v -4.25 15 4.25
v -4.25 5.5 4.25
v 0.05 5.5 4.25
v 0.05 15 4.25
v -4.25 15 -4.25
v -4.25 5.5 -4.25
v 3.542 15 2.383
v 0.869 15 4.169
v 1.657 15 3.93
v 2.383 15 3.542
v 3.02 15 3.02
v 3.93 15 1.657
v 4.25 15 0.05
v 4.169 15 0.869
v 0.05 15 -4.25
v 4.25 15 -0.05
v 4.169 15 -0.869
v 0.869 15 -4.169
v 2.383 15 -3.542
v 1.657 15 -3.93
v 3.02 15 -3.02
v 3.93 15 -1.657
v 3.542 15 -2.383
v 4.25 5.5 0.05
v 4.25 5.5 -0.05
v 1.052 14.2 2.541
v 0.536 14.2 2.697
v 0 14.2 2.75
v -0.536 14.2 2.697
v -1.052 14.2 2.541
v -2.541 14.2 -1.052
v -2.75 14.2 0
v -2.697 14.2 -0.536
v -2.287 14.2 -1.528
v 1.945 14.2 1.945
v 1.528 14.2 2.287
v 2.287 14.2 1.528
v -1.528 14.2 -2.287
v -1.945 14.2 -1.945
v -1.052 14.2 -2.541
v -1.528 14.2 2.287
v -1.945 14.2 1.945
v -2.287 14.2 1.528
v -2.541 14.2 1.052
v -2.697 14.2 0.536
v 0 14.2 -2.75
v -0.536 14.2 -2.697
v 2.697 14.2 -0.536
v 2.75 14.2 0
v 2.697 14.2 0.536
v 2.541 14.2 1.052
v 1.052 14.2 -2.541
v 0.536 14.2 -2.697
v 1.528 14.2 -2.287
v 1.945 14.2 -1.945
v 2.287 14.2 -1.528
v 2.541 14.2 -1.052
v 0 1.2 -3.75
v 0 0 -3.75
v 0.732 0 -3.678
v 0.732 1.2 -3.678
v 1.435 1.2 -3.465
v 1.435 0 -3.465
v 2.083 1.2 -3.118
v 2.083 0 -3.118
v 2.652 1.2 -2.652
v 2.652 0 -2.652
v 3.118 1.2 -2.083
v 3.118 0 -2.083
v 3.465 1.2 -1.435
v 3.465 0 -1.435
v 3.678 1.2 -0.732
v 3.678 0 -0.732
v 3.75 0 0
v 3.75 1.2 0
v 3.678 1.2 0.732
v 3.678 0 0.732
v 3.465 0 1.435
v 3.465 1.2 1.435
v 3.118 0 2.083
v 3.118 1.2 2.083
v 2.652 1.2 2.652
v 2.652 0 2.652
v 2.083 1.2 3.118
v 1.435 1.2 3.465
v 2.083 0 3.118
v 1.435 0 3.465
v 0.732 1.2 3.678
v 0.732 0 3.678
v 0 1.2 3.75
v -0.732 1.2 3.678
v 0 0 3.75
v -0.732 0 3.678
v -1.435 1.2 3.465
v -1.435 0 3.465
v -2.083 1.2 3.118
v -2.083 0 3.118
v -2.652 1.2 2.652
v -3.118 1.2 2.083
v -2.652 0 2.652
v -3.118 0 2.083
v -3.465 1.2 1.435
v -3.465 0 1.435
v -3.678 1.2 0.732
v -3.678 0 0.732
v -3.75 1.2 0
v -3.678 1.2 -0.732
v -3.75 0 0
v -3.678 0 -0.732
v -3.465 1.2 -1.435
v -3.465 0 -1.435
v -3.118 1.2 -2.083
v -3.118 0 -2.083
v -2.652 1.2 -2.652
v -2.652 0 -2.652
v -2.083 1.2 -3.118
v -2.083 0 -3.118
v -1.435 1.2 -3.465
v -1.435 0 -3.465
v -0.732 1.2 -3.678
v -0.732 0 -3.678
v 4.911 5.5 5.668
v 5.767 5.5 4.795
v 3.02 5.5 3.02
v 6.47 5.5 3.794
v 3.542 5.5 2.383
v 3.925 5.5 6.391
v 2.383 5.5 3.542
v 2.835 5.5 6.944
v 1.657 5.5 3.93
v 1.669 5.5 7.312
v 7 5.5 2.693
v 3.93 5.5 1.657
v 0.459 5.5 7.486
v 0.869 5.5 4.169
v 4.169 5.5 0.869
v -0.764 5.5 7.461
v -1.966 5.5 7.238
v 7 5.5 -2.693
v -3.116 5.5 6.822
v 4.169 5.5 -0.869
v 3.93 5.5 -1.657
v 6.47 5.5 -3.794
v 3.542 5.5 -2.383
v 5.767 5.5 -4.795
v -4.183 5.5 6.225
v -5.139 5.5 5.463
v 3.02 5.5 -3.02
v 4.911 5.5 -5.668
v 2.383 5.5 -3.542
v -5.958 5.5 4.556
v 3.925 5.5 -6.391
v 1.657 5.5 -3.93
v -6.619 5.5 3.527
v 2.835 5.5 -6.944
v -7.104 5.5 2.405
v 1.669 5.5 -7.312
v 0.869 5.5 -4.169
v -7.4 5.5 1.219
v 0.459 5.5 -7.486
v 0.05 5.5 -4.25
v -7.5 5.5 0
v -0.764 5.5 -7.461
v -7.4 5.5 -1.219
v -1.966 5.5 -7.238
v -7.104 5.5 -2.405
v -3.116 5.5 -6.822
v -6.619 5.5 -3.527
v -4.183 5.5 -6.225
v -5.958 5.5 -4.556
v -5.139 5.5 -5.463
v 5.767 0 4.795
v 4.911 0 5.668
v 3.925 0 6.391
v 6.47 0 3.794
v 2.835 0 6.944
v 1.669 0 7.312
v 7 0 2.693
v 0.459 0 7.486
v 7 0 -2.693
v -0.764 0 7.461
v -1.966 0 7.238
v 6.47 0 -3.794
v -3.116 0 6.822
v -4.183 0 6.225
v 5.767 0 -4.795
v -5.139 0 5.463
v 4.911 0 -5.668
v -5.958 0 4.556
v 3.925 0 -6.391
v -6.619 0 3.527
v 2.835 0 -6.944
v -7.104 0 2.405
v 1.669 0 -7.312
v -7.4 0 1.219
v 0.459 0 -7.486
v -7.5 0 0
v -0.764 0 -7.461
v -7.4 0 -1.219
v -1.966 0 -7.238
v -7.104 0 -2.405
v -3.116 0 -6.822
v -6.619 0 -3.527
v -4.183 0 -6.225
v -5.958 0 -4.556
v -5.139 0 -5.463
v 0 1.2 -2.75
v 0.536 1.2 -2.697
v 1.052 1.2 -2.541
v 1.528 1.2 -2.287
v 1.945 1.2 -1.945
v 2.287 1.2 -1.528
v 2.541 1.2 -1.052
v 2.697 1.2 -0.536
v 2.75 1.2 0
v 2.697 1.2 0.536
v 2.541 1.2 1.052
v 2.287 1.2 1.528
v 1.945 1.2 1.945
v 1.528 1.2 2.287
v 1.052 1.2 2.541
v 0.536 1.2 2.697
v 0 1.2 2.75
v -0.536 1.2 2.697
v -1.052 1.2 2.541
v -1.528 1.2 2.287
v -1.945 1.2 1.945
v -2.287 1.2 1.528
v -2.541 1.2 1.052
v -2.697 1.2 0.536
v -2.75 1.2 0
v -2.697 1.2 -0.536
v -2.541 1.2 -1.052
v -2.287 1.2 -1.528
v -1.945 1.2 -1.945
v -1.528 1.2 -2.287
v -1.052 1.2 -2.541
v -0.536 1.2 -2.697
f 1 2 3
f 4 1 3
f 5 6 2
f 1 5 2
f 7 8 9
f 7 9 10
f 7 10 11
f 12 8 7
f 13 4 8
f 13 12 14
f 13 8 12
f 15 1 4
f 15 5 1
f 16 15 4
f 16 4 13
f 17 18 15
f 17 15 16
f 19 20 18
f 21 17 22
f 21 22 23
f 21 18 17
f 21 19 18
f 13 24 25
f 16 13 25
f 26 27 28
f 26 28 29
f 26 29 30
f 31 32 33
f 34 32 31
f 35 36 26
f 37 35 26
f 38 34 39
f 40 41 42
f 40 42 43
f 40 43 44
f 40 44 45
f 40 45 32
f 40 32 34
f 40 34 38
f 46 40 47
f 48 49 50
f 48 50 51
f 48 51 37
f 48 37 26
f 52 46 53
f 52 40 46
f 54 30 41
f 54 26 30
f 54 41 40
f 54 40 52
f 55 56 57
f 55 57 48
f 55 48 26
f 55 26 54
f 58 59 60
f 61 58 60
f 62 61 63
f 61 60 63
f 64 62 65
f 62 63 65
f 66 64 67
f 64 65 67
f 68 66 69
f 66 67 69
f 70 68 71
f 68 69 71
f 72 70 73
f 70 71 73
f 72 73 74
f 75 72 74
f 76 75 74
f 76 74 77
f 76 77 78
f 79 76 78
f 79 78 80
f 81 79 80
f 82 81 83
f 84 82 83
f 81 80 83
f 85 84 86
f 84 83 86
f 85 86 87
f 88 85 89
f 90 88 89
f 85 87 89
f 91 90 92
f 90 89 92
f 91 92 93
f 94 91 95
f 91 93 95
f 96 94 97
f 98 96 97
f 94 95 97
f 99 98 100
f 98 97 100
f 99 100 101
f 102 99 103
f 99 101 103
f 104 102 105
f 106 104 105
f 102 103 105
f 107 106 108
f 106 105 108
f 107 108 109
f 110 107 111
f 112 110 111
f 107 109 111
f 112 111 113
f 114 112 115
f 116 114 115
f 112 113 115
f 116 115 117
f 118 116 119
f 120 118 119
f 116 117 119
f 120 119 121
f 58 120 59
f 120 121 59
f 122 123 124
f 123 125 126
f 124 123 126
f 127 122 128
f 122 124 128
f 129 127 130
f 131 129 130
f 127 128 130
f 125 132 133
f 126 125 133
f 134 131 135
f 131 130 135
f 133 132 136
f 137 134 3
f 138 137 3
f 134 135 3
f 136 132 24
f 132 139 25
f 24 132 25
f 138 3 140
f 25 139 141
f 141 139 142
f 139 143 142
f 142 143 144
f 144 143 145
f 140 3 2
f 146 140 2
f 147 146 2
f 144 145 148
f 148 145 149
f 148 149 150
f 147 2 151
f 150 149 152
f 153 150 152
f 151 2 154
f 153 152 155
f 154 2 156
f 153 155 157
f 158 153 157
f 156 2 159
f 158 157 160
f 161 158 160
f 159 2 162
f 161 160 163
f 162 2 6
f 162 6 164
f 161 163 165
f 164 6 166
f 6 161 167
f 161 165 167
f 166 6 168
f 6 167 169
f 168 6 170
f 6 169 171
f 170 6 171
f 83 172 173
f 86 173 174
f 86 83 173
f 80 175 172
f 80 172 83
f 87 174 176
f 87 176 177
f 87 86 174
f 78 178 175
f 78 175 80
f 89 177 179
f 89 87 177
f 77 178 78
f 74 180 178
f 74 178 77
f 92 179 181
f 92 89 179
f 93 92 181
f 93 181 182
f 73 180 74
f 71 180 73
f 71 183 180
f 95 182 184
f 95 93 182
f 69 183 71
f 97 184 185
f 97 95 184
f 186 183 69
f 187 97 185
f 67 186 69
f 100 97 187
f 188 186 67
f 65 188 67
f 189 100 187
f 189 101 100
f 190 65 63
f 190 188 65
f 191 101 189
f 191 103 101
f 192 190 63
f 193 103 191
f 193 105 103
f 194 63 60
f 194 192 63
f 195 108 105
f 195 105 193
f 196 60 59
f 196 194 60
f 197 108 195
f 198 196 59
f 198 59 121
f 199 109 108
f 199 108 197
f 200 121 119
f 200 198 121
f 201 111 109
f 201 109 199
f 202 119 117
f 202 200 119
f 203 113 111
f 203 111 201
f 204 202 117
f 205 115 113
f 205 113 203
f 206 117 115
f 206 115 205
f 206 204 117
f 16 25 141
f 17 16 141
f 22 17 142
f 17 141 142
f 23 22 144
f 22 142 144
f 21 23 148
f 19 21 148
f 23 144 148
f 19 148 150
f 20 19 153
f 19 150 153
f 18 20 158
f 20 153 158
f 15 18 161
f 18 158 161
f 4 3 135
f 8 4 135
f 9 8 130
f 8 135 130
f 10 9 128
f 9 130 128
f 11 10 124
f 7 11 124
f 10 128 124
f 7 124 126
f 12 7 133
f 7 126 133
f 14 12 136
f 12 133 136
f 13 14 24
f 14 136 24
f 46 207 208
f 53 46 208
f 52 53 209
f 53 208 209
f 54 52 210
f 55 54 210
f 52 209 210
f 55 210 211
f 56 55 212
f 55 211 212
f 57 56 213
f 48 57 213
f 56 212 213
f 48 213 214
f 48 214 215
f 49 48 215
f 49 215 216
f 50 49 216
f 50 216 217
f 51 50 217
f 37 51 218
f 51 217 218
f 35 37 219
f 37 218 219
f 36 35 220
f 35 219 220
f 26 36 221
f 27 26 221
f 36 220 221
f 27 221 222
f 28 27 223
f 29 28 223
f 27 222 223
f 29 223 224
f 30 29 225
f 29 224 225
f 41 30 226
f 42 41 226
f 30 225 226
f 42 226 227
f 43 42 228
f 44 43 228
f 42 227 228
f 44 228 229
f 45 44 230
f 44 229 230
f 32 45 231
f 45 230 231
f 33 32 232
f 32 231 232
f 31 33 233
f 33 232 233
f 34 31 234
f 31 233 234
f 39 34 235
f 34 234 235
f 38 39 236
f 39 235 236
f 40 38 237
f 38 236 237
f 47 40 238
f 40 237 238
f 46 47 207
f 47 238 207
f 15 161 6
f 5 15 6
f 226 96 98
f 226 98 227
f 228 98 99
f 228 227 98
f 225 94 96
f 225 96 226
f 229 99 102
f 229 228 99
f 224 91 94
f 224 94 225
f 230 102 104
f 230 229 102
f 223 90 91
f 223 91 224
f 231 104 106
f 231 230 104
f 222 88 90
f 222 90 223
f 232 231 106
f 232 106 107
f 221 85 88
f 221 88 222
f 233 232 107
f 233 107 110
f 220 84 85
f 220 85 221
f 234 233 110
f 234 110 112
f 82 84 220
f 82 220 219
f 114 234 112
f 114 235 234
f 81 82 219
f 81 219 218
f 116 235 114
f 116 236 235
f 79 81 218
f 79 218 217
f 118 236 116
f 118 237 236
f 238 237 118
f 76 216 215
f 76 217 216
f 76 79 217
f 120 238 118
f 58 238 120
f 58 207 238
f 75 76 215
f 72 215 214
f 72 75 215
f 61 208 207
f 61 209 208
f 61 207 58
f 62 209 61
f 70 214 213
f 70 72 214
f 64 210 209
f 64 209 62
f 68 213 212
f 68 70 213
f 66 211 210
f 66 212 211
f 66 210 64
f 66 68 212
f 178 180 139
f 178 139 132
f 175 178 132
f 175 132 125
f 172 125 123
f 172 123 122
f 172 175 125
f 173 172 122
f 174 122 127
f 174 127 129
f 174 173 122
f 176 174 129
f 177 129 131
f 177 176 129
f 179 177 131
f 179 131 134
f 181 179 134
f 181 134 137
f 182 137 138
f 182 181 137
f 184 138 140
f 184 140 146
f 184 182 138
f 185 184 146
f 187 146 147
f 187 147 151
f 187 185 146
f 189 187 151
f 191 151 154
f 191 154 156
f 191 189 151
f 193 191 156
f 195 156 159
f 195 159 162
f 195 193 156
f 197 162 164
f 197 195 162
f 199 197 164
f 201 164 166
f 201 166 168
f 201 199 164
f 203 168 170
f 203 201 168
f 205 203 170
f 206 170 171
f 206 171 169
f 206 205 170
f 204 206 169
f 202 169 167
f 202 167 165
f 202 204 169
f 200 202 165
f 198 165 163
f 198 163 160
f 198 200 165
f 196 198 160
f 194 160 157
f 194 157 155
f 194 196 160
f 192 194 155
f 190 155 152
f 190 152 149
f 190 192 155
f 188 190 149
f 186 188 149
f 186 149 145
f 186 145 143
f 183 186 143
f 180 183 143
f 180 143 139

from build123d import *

# Parameters (mm, degrees)
SALIENTE_EXTRUIR1_DEPTH = 5.5
SALIENTE_EXTRUIR2_DEPTH = 9.5
CROQUIS3_R              = 3.75
CORTAR_EXTRUIR1_DEPTH   = 1.2
CROQUIS5_R              = 2.75
CORTAR_EXTRUIR3_DEPTH   = 13


with BuildPart() as part:
    # Croquis1 → Saliente-Extruir1 (new body)
    with BuildSketch(Plane(origin=(0, 0, 0), x_dir=(1, 0, 0), z_dir=(0, 1, 0))):
        with BuildLine():
            Line((7, 2.692582404), (7, -2.692582404))
            ThreePointArc((7, -2.692582404), (-7.5, 0), (7, 2.692582404))
        make_face()
    extrude(amount=SALIENTE_EXTRUIR1_DEPTH)

    # Croquis2 → Saliente-Extruir2 (add)
    with BuildSketch(Plane(origin=(0, 5.5, 0), x_dir=(1, 0, 0), z_dir=(0, 1, 0))):
        with BuildLine():
            Line((-4.25, -4.25), (0.05, -4.25))
            ThreePointArc((0.05, -4.25), (3.019848481, -3.019848481), (4.25, -0.05))
            Line((4.25, -0.05), (4.25, 0.05))
            ThreePointArc((4.25, 0.05), (3.019848481, 3.019848481), (0.05, 4.25))
            Line((0.05, 4.25), (-4.25, 4.25))
            Line((-4.25, 4.25), (-4.25, -4.25))
        make_face()
    extrude(amount=SALIENTE_EXTRUIR2_DEPTH)

    # Croquis3 → Cortar-Extruir1 (cut)
    with BuildSketch(Plane.XZ):
        with Locations(Location((0, 0, 0), (0, 0, 270))):
            Circle(CROQUIS3_R)
    extrude(amount=-CORTAR_EXTRUIR1_DEPTH, mode=Mode.SUBTRACT)

    # Croquis5 → Cortar-Extruir3 (cut)
    with BuildSketch(Plane.XZ.offset(-1.2)):
        with Locations(Location((0, 0, 0), (0, 0, 270))):
            Circle(CROQUIS5_R)
    extrude(amount=-CORTAR_EXTRUIR3_DEPTH, mode=Mode.SUBTRACT)


solid = part.part
